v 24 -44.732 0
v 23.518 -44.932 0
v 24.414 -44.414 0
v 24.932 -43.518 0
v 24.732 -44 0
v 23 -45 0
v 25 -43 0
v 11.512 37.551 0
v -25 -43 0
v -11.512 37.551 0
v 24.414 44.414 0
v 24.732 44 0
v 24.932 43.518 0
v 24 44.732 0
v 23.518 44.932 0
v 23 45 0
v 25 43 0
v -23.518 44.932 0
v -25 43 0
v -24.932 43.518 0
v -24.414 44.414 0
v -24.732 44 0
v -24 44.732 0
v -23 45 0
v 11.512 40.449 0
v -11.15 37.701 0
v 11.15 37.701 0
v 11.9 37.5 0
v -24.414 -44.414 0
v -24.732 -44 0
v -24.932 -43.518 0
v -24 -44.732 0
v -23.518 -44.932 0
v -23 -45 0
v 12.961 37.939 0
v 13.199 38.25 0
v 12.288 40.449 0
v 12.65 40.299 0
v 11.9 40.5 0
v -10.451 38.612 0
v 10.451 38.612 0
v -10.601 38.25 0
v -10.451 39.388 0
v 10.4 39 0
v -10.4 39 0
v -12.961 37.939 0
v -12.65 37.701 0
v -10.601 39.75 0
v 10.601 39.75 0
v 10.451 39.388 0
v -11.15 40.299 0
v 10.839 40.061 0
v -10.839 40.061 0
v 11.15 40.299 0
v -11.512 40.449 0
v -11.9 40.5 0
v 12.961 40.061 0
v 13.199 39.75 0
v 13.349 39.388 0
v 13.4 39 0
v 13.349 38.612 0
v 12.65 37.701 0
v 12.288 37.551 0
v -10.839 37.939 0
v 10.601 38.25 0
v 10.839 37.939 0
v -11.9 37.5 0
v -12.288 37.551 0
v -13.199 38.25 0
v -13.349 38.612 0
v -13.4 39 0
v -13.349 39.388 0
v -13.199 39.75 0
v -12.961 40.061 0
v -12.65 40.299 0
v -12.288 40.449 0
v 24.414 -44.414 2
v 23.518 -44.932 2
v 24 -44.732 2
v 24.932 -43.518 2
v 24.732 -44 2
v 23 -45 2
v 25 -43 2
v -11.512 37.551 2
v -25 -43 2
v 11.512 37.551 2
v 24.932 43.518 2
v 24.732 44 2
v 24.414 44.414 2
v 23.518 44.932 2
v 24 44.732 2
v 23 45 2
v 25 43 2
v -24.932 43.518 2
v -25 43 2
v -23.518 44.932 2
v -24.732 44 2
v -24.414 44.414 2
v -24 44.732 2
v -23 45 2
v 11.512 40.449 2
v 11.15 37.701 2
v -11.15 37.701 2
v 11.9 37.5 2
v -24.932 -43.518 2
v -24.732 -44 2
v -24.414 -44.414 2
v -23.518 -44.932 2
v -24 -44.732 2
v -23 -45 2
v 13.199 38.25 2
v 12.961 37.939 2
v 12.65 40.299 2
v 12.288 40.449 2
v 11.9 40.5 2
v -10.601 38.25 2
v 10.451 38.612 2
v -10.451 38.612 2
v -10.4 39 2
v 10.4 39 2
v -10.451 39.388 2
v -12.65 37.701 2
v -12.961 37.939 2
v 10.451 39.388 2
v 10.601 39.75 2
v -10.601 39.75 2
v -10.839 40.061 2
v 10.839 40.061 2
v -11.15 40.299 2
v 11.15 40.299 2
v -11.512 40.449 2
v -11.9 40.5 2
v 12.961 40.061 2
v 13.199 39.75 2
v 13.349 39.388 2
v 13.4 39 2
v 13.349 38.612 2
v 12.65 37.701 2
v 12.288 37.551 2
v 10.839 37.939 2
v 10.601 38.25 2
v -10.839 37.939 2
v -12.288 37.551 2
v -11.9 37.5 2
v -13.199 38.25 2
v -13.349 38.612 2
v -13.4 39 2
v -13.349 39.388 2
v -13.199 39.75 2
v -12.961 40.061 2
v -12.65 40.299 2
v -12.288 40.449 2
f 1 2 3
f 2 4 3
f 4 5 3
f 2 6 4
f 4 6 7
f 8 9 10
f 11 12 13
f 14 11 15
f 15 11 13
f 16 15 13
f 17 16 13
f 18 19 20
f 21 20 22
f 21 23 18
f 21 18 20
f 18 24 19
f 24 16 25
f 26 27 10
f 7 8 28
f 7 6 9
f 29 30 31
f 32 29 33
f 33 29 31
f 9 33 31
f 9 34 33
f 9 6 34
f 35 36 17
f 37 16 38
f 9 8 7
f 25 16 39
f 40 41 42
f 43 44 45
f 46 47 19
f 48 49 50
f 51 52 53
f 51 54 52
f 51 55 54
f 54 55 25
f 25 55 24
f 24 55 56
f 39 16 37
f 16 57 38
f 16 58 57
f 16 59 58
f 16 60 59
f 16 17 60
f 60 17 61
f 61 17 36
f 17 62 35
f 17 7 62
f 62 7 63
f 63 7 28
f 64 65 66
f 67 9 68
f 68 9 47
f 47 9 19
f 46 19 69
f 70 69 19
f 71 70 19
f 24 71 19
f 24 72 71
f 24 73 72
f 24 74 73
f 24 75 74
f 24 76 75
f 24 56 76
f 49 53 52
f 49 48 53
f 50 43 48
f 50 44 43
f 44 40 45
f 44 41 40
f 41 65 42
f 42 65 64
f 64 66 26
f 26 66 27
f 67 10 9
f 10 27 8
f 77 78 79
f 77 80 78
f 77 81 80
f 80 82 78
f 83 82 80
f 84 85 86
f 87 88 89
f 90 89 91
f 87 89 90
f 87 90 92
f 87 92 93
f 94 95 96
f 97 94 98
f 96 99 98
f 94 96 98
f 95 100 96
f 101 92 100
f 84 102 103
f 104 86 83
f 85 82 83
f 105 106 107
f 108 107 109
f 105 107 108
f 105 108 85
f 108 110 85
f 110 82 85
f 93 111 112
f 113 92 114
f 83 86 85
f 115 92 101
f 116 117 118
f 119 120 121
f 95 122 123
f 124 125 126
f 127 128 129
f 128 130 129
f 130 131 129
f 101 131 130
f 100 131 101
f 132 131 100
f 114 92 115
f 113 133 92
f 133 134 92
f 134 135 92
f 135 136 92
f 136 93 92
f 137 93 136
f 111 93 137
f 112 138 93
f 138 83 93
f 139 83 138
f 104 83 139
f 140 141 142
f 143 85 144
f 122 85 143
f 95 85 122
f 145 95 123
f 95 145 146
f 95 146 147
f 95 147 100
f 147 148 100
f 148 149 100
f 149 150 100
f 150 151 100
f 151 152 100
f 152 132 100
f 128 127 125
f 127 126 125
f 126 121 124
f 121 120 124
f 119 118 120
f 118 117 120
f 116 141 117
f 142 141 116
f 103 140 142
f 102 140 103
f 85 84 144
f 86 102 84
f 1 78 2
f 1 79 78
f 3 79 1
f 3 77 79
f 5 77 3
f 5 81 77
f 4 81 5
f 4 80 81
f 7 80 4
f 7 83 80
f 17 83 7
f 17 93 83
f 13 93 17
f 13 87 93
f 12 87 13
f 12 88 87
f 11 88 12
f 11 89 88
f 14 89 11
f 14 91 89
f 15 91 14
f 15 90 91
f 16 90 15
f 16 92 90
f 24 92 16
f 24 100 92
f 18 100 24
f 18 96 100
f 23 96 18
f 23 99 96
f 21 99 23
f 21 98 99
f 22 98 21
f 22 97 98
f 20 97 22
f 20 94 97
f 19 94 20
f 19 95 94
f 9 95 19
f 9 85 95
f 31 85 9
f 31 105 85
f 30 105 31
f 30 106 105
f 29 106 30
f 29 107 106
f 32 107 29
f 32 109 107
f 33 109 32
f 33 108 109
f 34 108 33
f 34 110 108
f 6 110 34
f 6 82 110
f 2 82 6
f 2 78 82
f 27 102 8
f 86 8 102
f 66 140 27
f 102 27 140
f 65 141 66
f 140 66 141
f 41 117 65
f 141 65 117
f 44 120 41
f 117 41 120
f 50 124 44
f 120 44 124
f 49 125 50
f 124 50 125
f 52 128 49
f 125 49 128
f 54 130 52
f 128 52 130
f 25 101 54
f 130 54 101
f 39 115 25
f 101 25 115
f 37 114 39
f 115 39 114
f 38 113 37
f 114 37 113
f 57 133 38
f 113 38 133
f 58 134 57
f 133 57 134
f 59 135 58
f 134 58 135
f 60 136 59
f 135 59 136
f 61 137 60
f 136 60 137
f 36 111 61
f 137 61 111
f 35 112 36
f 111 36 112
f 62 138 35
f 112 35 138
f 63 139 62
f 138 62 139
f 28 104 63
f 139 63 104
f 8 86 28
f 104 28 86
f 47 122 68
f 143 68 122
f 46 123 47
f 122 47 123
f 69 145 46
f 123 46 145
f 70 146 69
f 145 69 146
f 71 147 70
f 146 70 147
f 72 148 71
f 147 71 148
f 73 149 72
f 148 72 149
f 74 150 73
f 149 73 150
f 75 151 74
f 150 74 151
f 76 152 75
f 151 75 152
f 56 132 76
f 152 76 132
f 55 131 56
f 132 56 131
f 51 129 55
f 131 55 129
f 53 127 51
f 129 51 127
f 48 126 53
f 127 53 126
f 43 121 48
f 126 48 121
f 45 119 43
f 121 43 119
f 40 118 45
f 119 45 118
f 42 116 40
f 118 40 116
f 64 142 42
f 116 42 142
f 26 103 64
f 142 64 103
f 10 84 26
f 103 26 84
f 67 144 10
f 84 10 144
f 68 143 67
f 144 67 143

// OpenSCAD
width = 50; //mm
length = 90; //mm
thickness = 2; //mm
radius = 2; //mm
hole_offset = 6; //mm
hole_distance = 23.8; //mm
hole_diameter = 3.0; //mm
cut_out = 60; //mm

$fn = 24;

linear_extrude(thickness) {
  difference() {
    minkowski() {
      square([width - 2 * radius, length - 2 * radius], center = true);
      circle(radius);
    }
    translate([0, length / 2 - hole_offset]) {
      translate([hole_distance / 2, 0]) {
        circle(d = hole_diameter);
      }
      translate([hole_distance / -2, 0]) {
        circle(d = hole_diameter);
      }
    }
  }
}
